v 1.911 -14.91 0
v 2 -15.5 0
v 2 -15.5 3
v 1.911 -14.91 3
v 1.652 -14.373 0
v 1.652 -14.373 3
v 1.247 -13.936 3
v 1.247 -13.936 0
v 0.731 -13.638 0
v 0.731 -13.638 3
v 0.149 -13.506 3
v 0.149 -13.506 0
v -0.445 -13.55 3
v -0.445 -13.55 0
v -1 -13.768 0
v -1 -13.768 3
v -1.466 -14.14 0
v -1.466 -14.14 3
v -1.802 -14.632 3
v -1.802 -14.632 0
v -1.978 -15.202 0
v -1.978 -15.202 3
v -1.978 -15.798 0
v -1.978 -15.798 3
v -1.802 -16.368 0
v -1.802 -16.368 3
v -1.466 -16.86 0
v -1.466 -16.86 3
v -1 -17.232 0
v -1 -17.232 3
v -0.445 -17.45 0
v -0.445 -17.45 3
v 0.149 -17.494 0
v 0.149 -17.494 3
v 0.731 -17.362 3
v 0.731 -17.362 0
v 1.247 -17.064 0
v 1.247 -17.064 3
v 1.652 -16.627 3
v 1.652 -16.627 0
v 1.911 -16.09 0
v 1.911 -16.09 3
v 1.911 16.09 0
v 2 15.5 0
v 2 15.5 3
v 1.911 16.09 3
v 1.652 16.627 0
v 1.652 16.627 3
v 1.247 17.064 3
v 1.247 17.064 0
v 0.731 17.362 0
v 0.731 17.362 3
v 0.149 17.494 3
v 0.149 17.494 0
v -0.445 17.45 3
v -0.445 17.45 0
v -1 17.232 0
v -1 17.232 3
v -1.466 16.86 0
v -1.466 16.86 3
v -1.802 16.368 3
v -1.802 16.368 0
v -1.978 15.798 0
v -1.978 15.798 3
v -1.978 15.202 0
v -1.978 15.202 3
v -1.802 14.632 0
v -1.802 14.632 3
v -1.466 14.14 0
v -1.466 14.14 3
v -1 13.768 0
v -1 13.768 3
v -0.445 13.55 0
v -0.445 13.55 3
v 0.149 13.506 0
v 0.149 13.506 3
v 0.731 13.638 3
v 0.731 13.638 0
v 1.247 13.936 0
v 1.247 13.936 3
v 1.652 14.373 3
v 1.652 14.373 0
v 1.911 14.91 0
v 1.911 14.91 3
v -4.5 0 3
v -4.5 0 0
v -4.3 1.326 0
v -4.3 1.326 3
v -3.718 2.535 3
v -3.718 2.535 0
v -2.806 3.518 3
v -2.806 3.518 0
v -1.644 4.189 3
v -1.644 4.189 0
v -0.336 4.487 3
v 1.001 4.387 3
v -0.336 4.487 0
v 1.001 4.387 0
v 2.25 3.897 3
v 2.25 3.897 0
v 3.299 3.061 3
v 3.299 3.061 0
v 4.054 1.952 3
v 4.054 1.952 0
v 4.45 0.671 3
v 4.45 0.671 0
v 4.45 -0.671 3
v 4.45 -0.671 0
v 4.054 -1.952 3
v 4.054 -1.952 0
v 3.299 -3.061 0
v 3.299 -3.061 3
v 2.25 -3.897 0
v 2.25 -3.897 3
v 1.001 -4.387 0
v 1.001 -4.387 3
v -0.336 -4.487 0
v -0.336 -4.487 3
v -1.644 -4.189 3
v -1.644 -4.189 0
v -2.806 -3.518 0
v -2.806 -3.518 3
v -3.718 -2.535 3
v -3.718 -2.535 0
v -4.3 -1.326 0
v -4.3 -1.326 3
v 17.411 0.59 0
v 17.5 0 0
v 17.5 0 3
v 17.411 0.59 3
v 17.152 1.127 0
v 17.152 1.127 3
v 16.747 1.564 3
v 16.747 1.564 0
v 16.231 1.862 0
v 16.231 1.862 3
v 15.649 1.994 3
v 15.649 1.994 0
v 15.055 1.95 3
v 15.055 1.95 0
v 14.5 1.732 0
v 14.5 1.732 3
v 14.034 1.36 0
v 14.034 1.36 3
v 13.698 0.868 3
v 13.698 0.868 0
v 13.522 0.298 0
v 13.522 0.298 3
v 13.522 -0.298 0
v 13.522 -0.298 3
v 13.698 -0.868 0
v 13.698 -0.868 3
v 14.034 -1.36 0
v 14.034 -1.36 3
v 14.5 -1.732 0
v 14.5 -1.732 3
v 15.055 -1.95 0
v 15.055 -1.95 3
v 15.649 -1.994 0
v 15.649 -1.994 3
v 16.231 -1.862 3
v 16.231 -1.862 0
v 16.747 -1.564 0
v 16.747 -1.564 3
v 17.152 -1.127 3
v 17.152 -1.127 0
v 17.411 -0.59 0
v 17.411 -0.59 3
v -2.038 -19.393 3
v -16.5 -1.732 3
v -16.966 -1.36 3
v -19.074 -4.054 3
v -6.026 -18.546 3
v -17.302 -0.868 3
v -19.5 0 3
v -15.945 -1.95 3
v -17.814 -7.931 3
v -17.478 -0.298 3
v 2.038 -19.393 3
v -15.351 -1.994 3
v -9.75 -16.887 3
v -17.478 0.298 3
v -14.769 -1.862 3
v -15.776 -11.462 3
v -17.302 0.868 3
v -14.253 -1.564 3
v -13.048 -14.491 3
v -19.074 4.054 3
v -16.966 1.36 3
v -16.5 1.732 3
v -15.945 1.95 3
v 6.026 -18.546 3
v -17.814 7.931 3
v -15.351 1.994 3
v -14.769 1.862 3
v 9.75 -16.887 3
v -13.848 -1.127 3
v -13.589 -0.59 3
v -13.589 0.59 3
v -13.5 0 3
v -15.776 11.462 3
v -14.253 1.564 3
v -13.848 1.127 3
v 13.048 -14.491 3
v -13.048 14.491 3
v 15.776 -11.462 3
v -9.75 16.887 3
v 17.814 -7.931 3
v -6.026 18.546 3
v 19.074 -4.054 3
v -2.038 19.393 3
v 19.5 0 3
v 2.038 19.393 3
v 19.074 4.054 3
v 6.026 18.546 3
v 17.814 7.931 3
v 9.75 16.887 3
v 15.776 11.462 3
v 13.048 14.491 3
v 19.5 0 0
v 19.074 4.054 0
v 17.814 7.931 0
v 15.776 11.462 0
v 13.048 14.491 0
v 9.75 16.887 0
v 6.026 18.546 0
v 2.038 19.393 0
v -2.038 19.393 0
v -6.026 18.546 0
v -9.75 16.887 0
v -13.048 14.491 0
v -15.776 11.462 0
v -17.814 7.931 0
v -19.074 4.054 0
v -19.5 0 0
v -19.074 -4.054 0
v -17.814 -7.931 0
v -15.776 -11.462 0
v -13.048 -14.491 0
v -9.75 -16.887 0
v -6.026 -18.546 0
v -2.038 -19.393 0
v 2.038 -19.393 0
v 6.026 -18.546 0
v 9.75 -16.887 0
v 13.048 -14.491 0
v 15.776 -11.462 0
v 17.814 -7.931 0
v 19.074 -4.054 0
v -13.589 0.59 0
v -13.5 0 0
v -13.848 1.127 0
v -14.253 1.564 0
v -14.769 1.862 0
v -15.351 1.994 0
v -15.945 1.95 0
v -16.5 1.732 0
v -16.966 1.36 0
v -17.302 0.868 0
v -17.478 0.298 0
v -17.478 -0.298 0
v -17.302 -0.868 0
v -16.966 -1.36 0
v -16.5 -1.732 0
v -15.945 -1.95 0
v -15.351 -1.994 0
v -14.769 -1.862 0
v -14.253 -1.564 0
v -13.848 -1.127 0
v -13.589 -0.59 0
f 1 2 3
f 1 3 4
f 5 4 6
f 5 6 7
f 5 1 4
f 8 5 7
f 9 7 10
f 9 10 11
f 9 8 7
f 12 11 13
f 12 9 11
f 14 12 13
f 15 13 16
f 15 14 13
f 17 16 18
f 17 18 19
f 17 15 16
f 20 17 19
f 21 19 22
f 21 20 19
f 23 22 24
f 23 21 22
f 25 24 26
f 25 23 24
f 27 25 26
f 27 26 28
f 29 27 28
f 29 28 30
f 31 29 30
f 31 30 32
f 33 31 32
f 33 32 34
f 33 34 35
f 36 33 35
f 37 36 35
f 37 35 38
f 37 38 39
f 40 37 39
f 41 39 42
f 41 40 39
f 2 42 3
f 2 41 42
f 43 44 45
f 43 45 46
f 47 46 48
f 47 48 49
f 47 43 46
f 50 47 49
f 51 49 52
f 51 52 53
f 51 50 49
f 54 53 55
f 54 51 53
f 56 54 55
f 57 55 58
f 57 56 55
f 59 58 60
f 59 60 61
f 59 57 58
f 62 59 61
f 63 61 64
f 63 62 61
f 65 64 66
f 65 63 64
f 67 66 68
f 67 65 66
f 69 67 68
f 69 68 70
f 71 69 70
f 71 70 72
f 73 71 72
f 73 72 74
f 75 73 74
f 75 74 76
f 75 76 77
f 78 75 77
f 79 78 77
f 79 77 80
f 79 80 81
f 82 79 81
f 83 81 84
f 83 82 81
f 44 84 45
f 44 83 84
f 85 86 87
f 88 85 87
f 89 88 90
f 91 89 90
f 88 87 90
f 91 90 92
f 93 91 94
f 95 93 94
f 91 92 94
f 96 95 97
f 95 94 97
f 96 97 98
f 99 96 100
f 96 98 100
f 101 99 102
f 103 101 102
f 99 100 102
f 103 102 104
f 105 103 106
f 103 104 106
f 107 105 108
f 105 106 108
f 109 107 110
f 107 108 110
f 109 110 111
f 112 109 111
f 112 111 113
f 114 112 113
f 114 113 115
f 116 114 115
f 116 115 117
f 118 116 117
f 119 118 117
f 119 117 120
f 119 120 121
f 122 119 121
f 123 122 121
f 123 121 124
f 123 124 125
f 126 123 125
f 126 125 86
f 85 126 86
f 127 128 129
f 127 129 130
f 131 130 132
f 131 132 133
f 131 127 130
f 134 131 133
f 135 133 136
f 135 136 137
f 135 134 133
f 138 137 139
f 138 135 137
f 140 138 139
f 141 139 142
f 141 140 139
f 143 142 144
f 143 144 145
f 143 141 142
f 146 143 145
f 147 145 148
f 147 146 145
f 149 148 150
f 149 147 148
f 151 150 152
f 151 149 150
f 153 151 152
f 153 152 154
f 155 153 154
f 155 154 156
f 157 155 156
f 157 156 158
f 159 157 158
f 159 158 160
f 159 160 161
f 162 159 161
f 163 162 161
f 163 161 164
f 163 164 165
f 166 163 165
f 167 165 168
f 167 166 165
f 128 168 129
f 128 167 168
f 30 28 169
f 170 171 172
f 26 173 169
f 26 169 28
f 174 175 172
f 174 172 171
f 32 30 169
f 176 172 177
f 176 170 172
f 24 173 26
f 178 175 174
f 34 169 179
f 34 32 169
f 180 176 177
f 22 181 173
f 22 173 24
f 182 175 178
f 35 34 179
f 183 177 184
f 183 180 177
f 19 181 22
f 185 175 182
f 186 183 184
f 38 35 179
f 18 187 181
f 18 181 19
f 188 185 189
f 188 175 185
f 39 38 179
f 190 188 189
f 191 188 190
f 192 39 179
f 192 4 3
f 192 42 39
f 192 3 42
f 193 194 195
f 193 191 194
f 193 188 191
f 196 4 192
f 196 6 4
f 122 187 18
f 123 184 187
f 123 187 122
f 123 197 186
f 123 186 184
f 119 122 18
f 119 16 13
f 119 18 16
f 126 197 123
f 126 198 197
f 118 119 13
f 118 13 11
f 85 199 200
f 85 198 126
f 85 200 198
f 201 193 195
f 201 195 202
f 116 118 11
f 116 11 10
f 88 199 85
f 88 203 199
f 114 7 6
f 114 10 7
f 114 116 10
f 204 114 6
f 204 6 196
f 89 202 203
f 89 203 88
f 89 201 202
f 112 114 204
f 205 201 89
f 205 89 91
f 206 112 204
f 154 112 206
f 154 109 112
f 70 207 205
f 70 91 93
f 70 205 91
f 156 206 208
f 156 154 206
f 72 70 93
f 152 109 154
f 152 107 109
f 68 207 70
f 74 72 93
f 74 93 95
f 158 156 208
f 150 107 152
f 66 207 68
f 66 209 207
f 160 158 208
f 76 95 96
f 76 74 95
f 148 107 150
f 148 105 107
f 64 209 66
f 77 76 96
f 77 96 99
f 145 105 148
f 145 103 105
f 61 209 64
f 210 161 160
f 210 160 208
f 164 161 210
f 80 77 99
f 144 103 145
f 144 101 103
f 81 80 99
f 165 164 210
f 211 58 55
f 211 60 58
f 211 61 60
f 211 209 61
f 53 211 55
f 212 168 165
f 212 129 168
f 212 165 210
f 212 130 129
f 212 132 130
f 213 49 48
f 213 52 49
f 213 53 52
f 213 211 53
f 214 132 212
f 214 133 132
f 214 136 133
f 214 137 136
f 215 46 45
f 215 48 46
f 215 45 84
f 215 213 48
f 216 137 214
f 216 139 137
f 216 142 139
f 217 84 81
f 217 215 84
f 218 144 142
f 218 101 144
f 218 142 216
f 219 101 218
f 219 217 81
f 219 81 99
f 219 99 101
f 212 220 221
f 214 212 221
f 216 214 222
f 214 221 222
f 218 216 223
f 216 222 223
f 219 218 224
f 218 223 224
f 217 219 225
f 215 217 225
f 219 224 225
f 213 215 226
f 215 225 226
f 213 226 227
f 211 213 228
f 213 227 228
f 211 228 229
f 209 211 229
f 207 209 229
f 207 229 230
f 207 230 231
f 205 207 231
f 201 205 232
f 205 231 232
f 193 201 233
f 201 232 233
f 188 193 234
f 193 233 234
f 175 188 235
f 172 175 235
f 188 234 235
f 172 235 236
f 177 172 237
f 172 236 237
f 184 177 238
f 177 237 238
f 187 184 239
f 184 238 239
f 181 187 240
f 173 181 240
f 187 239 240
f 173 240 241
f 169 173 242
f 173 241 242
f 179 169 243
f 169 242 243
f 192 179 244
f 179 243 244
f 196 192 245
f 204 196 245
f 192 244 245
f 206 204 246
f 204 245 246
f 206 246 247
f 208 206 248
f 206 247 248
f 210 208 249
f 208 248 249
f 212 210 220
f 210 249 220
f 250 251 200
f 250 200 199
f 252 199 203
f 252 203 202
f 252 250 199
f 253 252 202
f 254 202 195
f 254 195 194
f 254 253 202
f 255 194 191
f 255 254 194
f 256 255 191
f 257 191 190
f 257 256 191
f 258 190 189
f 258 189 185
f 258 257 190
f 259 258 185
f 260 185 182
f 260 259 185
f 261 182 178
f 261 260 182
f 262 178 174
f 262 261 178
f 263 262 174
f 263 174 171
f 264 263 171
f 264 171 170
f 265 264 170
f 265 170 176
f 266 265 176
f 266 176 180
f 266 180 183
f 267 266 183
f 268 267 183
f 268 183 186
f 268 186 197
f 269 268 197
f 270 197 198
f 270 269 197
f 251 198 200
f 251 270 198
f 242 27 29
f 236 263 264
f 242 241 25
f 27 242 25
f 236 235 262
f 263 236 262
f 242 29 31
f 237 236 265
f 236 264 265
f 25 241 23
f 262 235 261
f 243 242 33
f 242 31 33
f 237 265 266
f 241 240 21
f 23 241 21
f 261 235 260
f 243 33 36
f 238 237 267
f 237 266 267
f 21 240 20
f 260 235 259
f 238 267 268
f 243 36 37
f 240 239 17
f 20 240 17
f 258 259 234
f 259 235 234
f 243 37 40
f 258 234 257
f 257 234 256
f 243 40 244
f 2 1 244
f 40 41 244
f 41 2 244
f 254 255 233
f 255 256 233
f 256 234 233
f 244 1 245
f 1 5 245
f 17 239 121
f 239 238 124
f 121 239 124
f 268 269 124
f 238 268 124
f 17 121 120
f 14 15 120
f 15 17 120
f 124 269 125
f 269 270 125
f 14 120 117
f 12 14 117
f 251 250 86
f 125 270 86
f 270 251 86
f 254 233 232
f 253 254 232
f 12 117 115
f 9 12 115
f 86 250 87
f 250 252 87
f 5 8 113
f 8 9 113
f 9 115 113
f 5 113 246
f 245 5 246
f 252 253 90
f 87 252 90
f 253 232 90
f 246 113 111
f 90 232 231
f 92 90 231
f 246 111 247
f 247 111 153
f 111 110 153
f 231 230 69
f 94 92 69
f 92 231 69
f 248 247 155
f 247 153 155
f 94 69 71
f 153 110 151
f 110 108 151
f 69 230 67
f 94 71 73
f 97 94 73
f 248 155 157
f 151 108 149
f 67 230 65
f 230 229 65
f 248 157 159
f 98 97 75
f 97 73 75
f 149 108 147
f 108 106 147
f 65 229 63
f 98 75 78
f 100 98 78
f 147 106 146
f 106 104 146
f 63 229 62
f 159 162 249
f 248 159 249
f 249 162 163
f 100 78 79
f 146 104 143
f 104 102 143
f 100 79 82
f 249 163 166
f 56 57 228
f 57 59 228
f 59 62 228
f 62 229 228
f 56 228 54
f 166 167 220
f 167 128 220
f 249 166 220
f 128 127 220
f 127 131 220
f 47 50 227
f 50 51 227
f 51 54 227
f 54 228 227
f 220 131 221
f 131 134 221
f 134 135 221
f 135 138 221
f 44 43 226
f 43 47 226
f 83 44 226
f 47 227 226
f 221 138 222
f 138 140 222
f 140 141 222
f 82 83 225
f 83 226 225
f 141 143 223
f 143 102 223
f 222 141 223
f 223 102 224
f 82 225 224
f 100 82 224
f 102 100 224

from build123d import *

# Parameters (mm, degrees)
CROQUIS1_R              = 19.5
CROQUIS1_R_2            = 2
SALIENTE_EXTRUIR1_DEPTH = 3
CROQUIS4_R              = 4.5
CORTAR_EXTRUIR1_DEPTH   = 1
CROQUIS4_2_R            = 4.5
CORTAR_EXTRUIR2_DEPTH   = 3


with BuildPart() as part:
    # Croquis1 → Saliente-Extruir1 (new body)
    with BuildSketch(Plane.XY):
        Circle(CROQUIS1_R)
        with Locations((0, -15.5)):
            Circle(CROQUIS1_R_2, mode=Mode.SUBTRACT)
        with Locations((15.5, 0)):
            Circle(CROQUIS1_R_2, mode=Mode.SUBTRACT)
        with Locations((0, 15.5)):
            Circle(CROQUIS1_R_2, mode=Mode.SUBTRACT)
        with Locations((-15.5, 0)):
            Circle(CROQUIS1_R_2, mode=Mode.SUBTRACT)
    extrude(amount=SALIENTE_EXTRUIR1_DEPTH)

    # Croquis4 → Cortar-Extruir1 (cut)
    with BuildSketch(Plane(origin=(0, 0, 0), x_dir=(-1, 0, 0), z_dir=(0, 0, -1))):
        Circle(CROQUIS4_R)
    extrude(amount=-CORTAR_EXTRUIR1_DEPTH, mode=Mode.SUBTRACT)

    # Croquis4<2> → Cortar-Extruir2 (cut)
    with BuildSketch(Plane(origin=(0, 0, 0), x_dir=(-1, 0, 0), z_dir=(0, 0, -1))):
        Circle(CROQUIS4_2_R)
    extrude(amount=-CORTAR_EXTRUIR2_DEPTH, mode=Mode.SUBTRACT)


solid = part.part
